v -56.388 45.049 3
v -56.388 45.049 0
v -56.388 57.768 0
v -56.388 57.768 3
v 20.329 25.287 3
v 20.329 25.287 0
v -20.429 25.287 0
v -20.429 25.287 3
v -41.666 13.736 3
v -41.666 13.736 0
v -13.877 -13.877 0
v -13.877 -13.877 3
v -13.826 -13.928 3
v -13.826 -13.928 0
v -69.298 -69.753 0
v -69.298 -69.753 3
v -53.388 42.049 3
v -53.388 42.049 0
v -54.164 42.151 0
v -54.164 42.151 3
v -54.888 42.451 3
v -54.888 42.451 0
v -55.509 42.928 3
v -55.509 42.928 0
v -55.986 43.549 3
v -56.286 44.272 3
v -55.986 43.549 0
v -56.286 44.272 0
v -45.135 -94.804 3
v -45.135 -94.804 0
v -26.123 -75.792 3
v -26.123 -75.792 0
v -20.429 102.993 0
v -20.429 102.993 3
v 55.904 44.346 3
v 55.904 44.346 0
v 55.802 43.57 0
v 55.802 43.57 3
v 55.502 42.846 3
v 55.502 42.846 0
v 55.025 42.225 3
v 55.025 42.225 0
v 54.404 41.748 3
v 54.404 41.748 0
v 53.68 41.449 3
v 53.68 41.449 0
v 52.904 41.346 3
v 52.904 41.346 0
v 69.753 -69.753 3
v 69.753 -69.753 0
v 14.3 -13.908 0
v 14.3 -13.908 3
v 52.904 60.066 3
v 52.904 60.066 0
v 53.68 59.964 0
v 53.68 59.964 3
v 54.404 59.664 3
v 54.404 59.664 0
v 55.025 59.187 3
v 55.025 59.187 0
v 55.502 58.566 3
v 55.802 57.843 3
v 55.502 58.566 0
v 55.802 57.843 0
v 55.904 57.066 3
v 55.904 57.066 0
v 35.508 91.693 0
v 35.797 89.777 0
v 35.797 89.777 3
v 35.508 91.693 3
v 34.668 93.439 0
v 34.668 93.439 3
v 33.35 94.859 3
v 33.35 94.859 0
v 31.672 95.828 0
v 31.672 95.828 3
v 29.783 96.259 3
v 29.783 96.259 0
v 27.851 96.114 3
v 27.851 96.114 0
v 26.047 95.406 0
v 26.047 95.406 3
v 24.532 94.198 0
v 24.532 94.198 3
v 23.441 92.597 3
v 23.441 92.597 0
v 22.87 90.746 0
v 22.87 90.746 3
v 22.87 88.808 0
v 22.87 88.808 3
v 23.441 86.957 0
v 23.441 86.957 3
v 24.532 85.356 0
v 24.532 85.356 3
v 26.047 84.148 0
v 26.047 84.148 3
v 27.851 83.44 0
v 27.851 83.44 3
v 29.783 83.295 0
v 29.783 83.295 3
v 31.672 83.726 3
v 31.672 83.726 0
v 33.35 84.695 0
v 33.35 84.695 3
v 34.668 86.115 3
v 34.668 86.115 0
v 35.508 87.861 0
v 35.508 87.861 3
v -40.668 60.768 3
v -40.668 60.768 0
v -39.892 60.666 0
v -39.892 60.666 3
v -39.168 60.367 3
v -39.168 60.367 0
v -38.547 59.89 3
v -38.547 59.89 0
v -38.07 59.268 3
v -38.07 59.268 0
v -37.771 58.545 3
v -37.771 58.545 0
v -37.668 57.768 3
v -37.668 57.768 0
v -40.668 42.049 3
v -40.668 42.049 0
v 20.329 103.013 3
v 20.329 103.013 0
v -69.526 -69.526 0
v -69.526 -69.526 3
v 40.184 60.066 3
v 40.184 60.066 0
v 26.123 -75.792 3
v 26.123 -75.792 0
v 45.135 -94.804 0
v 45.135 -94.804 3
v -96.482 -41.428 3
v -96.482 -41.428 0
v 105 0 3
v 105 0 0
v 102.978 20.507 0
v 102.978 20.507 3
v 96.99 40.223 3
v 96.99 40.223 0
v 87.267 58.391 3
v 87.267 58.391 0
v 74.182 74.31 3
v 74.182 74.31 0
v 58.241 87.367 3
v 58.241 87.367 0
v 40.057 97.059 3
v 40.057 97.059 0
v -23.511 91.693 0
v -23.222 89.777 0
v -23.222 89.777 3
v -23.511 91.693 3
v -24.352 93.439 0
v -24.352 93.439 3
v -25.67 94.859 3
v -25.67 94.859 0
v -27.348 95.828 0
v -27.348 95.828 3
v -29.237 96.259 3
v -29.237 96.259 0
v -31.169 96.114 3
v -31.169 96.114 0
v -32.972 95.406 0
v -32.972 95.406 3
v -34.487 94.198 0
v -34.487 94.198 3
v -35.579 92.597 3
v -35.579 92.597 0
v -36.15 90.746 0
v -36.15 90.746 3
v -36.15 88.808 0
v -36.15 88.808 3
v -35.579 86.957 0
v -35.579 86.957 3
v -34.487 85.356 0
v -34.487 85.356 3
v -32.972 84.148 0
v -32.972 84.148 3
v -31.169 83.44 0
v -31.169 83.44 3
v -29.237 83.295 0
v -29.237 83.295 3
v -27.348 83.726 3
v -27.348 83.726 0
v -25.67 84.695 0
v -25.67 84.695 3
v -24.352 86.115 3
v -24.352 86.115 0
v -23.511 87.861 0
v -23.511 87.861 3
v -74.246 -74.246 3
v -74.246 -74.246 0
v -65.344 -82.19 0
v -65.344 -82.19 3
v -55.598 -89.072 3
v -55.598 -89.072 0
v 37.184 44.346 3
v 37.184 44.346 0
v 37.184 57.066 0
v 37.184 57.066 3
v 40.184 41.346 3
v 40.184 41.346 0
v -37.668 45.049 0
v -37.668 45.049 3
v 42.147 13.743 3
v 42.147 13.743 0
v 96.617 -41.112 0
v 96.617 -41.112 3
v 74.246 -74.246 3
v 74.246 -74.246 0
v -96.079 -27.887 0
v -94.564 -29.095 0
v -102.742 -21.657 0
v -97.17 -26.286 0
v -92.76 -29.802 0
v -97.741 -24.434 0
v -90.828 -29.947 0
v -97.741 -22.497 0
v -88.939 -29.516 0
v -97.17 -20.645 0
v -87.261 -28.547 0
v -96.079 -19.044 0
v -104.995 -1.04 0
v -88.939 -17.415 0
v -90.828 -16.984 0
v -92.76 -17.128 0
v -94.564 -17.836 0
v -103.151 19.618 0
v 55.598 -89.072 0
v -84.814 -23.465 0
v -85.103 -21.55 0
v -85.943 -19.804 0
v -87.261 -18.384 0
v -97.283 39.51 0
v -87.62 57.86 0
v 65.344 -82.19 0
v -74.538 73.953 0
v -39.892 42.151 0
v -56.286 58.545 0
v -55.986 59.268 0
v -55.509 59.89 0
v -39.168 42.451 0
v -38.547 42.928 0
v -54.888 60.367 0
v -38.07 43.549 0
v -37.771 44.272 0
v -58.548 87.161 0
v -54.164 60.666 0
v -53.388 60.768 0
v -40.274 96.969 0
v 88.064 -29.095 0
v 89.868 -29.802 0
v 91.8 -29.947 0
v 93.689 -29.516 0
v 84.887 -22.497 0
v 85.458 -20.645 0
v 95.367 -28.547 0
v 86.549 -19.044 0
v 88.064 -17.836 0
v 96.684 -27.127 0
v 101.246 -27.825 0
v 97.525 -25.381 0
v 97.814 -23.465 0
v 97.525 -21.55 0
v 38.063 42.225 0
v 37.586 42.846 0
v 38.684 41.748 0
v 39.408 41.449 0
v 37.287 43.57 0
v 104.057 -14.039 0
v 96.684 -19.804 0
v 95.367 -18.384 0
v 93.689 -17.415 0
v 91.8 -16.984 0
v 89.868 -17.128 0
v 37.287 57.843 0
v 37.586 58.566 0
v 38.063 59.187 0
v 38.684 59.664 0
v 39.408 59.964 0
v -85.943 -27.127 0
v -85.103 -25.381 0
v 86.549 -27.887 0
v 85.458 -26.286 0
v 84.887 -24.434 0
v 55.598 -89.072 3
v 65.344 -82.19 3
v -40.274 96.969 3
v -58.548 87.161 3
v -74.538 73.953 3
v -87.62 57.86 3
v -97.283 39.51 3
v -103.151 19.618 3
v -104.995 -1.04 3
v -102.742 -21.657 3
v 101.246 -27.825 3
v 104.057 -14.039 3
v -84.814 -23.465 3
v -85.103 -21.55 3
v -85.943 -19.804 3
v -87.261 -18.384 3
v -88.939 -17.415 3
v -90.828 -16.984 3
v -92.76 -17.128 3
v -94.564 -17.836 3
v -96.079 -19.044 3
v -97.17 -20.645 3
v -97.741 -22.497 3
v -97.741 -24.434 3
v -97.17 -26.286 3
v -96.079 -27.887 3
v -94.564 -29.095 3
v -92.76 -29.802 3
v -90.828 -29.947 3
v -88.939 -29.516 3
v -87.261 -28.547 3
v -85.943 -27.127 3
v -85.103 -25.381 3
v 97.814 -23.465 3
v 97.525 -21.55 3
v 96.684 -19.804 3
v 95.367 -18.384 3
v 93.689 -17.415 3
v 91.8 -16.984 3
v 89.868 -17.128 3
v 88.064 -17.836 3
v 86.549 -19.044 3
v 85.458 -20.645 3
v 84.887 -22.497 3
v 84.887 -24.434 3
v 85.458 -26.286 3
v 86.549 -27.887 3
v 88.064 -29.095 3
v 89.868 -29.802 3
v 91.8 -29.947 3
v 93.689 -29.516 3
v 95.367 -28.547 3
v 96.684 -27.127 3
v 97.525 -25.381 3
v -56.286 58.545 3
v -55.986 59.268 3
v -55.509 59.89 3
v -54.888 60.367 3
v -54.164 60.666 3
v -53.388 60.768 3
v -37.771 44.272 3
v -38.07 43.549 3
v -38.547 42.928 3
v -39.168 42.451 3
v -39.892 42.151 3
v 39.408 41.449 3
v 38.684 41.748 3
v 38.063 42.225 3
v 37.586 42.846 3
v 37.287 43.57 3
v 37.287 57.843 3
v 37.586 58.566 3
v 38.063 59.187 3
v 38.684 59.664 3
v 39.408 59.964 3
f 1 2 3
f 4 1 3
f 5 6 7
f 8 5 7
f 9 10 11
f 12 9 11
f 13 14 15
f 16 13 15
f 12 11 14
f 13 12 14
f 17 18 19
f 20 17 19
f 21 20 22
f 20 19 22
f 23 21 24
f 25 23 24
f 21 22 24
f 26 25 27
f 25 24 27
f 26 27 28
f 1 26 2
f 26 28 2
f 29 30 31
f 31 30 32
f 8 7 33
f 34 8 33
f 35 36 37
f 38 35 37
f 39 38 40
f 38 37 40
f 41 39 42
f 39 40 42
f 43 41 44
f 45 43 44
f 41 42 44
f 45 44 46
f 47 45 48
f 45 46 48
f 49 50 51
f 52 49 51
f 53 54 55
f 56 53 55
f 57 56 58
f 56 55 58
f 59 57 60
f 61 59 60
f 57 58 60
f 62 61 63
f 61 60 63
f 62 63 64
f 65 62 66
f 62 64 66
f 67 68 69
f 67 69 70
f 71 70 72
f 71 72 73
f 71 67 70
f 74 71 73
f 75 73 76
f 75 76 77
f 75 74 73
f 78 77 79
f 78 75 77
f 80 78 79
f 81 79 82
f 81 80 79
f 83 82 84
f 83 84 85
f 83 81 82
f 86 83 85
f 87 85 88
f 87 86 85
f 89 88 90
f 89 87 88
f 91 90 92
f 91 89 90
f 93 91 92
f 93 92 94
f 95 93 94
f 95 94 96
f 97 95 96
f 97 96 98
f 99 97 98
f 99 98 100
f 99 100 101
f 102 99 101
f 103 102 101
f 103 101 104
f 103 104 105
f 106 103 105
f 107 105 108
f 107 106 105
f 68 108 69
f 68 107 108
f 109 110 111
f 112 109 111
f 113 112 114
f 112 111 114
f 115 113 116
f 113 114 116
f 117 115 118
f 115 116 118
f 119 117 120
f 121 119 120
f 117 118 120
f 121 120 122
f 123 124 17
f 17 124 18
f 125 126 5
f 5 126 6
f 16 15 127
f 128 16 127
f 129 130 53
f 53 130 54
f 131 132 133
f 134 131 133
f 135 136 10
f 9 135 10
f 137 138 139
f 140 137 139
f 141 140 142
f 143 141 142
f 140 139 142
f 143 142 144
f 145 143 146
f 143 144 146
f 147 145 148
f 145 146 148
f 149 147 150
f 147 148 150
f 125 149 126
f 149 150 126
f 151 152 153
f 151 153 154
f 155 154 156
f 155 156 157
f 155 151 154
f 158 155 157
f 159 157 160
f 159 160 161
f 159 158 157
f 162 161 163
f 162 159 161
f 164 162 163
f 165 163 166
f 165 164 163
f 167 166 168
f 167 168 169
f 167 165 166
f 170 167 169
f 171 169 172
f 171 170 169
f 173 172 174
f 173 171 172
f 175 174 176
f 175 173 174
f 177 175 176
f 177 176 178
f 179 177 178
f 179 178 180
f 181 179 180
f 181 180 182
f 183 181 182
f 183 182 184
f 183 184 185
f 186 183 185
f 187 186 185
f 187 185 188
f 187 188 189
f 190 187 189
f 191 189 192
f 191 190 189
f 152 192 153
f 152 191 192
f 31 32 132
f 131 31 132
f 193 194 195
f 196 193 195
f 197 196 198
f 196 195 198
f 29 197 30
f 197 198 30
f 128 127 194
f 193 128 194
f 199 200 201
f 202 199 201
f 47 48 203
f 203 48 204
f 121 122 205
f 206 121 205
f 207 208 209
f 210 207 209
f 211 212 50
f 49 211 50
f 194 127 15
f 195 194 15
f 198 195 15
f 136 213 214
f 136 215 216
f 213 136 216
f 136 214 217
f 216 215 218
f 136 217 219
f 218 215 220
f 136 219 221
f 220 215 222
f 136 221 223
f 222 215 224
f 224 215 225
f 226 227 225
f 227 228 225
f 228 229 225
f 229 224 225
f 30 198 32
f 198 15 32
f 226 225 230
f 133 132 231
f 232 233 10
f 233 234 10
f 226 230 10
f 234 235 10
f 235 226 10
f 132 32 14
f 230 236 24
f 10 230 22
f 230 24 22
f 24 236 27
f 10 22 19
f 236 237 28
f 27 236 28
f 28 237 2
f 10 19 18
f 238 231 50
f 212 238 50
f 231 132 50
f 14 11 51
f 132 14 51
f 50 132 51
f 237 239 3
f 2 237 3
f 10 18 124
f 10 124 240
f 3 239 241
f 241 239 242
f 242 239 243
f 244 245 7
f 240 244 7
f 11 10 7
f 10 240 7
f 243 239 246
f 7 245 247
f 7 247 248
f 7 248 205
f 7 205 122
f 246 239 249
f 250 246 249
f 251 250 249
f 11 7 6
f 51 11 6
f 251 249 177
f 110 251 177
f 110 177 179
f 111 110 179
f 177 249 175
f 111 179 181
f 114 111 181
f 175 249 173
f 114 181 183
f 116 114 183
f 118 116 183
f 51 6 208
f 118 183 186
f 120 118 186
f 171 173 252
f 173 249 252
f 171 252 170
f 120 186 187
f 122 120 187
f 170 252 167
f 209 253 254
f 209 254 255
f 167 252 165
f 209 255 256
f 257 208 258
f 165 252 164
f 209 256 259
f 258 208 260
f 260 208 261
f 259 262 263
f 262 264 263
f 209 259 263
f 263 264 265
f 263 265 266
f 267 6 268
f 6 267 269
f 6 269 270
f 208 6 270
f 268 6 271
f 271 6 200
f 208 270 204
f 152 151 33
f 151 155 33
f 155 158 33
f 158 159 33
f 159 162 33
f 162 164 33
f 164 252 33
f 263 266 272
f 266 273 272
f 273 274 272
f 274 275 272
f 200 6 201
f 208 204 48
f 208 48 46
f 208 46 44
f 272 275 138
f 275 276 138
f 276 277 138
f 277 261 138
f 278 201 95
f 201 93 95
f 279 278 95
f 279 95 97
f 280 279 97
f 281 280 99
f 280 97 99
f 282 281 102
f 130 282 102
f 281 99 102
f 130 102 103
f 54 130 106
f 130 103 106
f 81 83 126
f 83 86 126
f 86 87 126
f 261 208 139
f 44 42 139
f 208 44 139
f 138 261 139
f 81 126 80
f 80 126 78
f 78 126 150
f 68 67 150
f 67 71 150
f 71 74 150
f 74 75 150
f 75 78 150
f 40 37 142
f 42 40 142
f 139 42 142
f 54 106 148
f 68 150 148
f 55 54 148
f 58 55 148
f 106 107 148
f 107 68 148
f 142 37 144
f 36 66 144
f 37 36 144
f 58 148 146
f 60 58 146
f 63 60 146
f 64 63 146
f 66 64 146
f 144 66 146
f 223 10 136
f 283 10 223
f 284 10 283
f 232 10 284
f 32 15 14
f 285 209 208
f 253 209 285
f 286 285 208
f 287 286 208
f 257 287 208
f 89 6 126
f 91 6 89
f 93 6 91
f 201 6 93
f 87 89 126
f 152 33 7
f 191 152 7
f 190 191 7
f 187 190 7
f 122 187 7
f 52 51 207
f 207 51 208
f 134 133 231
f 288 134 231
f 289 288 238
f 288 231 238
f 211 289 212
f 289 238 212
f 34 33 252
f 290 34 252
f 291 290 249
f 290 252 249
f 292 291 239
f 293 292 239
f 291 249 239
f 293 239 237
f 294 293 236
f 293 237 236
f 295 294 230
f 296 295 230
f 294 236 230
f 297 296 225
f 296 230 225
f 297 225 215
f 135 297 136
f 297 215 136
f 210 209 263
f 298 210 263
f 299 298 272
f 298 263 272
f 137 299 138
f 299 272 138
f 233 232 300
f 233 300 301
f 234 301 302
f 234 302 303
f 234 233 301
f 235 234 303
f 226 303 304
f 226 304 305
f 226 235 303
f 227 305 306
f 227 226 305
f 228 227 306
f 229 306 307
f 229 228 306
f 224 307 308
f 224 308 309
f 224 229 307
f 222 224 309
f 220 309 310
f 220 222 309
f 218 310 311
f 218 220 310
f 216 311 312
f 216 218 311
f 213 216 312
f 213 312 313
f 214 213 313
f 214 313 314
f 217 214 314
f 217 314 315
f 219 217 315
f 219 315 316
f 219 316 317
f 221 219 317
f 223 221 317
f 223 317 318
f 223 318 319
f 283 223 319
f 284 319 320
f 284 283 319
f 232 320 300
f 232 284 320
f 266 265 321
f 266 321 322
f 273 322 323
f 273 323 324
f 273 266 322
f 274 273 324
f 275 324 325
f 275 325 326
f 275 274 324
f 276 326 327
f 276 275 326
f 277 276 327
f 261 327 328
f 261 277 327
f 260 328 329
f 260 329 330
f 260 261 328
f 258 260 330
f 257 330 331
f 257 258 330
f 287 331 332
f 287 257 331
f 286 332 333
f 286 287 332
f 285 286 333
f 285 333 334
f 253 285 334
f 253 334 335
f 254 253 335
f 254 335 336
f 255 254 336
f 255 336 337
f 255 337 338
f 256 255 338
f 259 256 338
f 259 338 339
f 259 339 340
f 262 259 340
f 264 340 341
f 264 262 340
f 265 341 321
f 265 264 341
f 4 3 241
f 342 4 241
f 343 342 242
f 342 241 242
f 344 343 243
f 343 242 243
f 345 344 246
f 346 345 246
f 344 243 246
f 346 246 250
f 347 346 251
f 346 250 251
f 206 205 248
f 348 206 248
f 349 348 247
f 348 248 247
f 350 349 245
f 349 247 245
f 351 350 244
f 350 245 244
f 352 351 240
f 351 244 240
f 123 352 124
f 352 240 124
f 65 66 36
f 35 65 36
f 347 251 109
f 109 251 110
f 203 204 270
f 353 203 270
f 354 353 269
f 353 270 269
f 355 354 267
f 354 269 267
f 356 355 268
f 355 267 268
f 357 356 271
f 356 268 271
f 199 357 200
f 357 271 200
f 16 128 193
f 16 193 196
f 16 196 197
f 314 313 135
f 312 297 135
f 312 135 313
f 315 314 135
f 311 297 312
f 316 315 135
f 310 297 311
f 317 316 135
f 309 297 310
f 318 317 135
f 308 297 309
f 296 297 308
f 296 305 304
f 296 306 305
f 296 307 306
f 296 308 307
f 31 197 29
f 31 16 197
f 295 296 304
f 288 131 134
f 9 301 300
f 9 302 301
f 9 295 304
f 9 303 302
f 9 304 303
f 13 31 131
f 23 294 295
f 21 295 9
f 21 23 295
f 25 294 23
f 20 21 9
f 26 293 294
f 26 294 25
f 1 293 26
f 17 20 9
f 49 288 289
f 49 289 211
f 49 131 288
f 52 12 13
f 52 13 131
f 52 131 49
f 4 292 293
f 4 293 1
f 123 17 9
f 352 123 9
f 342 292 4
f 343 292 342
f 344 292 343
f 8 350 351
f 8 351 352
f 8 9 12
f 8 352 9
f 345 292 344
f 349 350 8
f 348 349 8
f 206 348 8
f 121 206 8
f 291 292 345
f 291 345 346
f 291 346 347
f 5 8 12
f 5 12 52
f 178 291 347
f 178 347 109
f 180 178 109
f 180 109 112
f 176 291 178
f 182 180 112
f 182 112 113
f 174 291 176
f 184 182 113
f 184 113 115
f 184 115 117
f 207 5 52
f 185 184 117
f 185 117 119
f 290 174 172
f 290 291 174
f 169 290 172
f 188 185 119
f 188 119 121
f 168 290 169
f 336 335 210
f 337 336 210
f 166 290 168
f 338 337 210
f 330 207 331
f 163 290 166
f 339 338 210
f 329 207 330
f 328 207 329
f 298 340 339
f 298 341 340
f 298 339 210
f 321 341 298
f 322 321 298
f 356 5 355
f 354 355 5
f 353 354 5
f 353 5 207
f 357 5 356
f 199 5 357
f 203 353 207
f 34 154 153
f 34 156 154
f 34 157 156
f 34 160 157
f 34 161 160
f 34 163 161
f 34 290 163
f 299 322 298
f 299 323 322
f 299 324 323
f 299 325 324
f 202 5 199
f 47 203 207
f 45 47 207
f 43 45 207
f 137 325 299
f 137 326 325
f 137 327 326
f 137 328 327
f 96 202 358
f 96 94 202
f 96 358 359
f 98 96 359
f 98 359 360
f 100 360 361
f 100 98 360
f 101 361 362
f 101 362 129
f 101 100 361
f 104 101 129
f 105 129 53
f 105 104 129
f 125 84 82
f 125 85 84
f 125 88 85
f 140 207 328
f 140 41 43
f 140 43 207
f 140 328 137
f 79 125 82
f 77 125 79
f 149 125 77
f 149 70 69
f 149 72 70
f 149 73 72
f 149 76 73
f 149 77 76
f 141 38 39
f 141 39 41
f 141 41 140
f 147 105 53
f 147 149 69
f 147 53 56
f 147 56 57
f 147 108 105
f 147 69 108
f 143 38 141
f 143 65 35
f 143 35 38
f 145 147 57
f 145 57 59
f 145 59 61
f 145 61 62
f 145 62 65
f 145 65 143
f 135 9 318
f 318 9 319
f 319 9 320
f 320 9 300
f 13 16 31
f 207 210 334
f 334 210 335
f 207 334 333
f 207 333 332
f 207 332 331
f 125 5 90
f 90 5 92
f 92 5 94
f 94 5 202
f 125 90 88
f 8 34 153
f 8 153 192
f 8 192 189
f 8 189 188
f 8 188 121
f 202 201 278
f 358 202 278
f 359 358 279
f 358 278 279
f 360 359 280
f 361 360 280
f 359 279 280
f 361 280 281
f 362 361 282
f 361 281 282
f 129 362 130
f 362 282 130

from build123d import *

# Parameters (mm, degrees)
F0_R     = 6.5
F1_DEPTH = 3


with BuildPart() as f1:
    # F0 (on Top) → F1 (new body)
    with BuildSketch(Plane.XY):
        with BuildLine():
            ThreePointArc((-20.428937125, 102.9934877939), (-92.9055396428, 48.9240299208), (-96.4815047793, -41.4284833844))
            Line((-96.4815047793, -41.4284833844), (-41.6658031427, 13.7363909711))
            Line((-41.6658031427, 13.7363909711), (-13.8767590343, -13.8767590343))
            Line((-13.8767590343, -13.8767590343), (0, 0))
            Line((0, 0), (0, 25.2874530852))
            Line((0, 25.2874530852), (-20.428937125, 25.2874530852))
            Line((-20.428937125, 25.2874530852), (-20.428937125, 102.9934877939))
        make_face()
        with Locations((-91.3139134645, -23.4654136002)):
            Circle(F0_R, mode=Mode.SUBTRACT)
        with BuildLine():
            ThreePointArc((-56.388001889, 57.7684769799), (-55.5093222326, 59.8897973234), (-53.388001889, 60.7684769799))
            Line((-53.388001889, 60.7684769799), (-40.6683964263, 60.7684769799))
            ThreePointArc((-40.6683964263, 60.7684769799), (-38.5470760828, 59.8897973234), (-37.6683964263, 57.7684769799))
            Line((-37.6683964263, 57.7684769799), (-37.6683964263, 45.0488715172))
            ThreePointArc((-37.6683964263, 45.0488715172), (-38.5470760828, 42.9275511736), (-40.6683964263, 42.0488715172))
            Line((-40.6683964263, 42.0488715172), (-53.388001889, 42.0488715172))
            ThreePointArc((-53.388001889, 42.0488715172), (-55.5093222326, 42.9275511736), (-56.388001889, 45.0488715172))
            Line((-56.388001889, 45.0488715172), (-56.388001889, 57.7684769799))
        make_face(mode=Mode.SUBTRACT)
        with Locations((-29.722429812, 89.7770151496)):
            Circle(F0_R, mode=Mode.SUBTRACT)
        with BuildLine():
            Line((0, 25.2874530852), (0, 0))
            Line((0, 0), (69.7533435465, -69.7533435465))
            Line((69.7533435465, -69.7533435465), (14.3003088274, -13.9084606974))
            Line((14.3003088274, -13.9084606974), (42.1468239183, 13.7426630826))
            Line((42.1468239183, 13.7426630826), (96.6167267267, -41.1121407447))
            ThreePointArc((96.6167267267, -41.1121407447), (102.8828370194, -20.9790811726), (105, 0))
            ThreePointArc((105, 0), (81.1159350321, 66.6723712182), (20.3294269741, 103.013175851))
            Line((20.3294269741, 103.013175851), (20.3294269741, 25.2874530852))
            Line((20.3294269741, 25.2874530852), (0, 25.2874530852))
        make_face()
        with Locations((91.3139144, -23.4654136002)):
            Circle(F0_R, mode=Mode.SUBTRACT)
        with BuildLine():
            ThreePointArc((37.1843986213, 57.0661032964), (38.0630782778, 59.18742364), (40.1843986213, 60.0661032964))
            Line((40.1843986213, 60.0661032964), (52.904004084, 60.0661032964))
            ThreePointArc((52.904004084, 60.0661032964), (55.0253244276, 59.18742364), (55.904004084, 57.0661032964))
            Line((55.904004084, 57.0661032964), (55.904004084, 44.3464978337))
            ThreePointArc((55.904004084, 44.3464978337), (55.0253244276, 42.2251774902), (52.904004084, 41.3464978337))
            Line((52.904004084, 41.3464978337), (40.1843986213, 41.3464978337))
            ThreePointArc((40.1843986213, 41.3464978337), (38.0630782778, 42.2251774902), (37.1843986213, 44.3464978337))
            Line((37.1843986213, 44.3464978337), (37.1843986213, 57.0661032964))
        make_face(mode=Mode.SUBTRACT)
        with Locations((29.2972179146, 89.7770151496)):
            Circle(F0_R, mode=Mode.SUBTRACT)
        with BuildLine():
            Line((-69.5263431778, -69.5263431778), (-74.2462120246, -74.2462120246))
            ThreePointArc((-74.2462120246, -74.2462120246), (-60.5690845883, -85.7693767736), (-45.1347826829, -94.804279398))
            Line((-45.1347826829, -94.804279398), (-26.1228149757, -75.7923116907))
            Line((-26.1228149757, -75.7923116907), (0, -49.6694967151))
            Line((0, -49.6694967151), (0, 0))
            Line((0, 0), (-13.8767590343, -13.8767590343))
            Line((-13.8767590343, -13.8767590343), (-13.825551364, -13.9276425795))
            Line((-13.825551364, -13.9276425795), (-69.2978968304, -69.7533435465))
            Line((-69.2978968304, -69.7533435465), (-69.5263431778, -69.5263431778))
        make_face()
        with BuildLine():
            Line((26.1228149757, -75.7923116907), (45.1347826829, -94.804279398))
            ThreePointArc((45.1347826829, -94.804279398), (60.5690845883, -85.7693767736), (74.2462120246, -74.2462120246))
            Line((74.2462120246, -74.2462120246), (69.7533435465, -69.7533435465))
            Line((69.7533435465, -69.7533435465), (0, 0))
            Line((0, 0), (0, -49.6694967151))
            Line((0, -49.6694967151), (26.1228149757, -75.7923116907))
        make_face()
        Polygon((0, -49.6694967151), (-26.1228149757, -75.7923116907), (0, -75.7923116907), (0, -64.7160249151), align=None)
        Polygon((0, -64.7160249151), (0, -75.7923116907), (26.1228149757, -75.7923116907), (0, -49.6694967151), align=None)
    extrude(amount=F1_DEPTH)


solid = f1.part
